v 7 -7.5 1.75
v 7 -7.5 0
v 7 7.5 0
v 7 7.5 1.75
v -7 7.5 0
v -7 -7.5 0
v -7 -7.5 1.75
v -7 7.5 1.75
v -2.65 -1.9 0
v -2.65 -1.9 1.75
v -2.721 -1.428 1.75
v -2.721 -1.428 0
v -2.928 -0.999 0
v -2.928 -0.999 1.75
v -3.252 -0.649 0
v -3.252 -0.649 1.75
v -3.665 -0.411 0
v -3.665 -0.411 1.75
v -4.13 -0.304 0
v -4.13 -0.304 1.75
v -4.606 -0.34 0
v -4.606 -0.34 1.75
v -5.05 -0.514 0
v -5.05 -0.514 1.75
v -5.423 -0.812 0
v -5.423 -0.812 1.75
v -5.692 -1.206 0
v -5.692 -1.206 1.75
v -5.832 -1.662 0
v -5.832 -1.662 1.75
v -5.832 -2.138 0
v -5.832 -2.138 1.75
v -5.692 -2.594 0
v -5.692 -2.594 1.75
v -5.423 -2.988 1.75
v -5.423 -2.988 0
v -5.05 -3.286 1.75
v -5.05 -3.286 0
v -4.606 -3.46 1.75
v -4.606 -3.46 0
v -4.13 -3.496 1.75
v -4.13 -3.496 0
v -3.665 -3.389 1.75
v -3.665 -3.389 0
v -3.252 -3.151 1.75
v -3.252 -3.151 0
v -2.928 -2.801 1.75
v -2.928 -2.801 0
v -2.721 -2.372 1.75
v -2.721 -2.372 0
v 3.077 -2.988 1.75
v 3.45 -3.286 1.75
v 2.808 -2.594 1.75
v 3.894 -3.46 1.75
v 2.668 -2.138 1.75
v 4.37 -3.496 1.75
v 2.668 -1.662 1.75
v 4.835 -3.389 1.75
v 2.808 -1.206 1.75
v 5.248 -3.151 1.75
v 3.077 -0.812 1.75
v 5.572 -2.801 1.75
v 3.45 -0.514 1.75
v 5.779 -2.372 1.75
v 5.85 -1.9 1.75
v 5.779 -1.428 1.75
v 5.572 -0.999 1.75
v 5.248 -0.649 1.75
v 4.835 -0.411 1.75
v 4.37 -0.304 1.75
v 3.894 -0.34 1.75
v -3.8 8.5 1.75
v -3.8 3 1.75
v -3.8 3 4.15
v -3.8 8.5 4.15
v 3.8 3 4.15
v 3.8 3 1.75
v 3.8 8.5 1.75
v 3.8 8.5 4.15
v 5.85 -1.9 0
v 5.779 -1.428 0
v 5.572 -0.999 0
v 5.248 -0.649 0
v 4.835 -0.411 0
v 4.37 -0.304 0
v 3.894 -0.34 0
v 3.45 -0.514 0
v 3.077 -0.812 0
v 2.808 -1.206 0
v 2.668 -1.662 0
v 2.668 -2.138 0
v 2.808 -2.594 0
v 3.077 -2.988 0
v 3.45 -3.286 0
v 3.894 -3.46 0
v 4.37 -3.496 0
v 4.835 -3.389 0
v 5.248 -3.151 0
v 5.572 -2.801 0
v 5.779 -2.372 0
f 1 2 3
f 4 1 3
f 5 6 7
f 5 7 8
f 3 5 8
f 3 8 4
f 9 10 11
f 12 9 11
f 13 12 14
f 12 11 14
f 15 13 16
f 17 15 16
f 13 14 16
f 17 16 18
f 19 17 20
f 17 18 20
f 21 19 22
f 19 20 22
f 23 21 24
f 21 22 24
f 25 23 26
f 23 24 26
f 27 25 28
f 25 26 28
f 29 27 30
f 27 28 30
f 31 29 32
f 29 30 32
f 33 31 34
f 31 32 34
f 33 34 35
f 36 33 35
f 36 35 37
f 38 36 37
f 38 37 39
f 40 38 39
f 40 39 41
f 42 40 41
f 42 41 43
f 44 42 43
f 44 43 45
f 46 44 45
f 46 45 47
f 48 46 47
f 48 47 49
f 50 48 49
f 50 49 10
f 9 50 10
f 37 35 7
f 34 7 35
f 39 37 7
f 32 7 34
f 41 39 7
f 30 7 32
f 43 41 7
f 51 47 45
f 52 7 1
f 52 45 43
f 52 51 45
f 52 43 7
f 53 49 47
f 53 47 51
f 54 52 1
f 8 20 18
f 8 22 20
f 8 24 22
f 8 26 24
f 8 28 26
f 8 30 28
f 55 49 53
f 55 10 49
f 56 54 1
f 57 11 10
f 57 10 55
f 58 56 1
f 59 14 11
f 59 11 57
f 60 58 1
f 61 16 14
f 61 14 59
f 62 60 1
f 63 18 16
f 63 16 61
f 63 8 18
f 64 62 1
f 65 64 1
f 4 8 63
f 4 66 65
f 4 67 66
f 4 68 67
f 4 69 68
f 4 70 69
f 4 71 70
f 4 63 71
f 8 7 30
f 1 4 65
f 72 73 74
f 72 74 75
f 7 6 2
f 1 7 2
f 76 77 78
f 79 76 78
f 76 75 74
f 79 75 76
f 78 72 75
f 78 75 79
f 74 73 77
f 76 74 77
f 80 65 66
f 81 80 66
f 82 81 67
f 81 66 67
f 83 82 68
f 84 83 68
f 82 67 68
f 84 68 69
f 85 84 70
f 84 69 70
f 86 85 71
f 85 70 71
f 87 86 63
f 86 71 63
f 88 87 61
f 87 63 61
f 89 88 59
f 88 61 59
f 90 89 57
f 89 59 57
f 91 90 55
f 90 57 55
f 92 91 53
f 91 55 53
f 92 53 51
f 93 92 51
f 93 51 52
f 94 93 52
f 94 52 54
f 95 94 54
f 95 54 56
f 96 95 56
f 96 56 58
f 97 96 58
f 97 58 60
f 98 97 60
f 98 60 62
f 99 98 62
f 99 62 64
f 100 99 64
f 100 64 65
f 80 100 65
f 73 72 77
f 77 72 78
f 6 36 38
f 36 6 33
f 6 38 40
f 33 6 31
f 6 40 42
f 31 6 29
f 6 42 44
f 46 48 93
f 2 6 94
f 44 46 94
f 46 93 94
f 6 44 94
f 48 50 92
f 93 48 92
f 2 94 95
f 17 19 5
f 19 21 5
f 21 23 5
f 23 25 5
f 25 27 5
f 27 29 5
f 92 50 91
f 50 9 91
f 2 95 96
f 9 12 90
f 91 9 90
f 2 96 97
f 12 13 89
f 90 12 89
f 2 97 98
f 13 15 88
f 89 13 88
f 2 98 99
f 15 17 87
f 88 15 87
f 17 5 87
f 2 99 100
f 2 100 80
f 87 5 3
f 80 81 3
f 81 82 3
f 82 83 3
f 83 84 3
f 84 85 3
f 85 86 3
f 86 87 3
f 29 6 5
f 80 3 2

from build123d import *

# Parameters (mm, degrees)
SKETCH_W     = 14
SKETCH_H     = 15
PAD_DEPTH    = 1.75
SKETCH002_R  = 1.6
POCKET_DEPTH = 5
SKETCH001_W  = 7.6
SKETCH001_H  = 5.5
PAD001_DEPTH = 2.4


with BuildPart() as body:
    # Sketch → Pad (new body)
    with BuildSketch(Plane.XY):
        Rectangle(SKETCH_W, SKETCH_H)
    extrude(amount=PAD_DEPTH)

    # Sketch002 (on Face6 of Pad) → Pocket (cut)
    with BuildSketch(Plane.XY.offset(1.75)):
        with Locations((-4.25, -1.9)):
            Circle(SKETCH002_R)
        with Locations((4.25, -1.9)):
            Circle(SKETCH002_R)
    extrude(amount=-POCKET_DEPTH, mode=Mode.SUBTRACT)


with BuildPart() as body001:
    # Sketch001 (on Face1 of CopyPad) → Pad001 (new body)
    with BuildSketch(Plane.XY.offset(1.75)):
        with Locations((0, 5.75)):
            Rectangle(SKETCH001_W, SKETCH001_H)
    extrude(amount=PAD001_DEPTH)


solid = Compound([body.part, body001.part])
